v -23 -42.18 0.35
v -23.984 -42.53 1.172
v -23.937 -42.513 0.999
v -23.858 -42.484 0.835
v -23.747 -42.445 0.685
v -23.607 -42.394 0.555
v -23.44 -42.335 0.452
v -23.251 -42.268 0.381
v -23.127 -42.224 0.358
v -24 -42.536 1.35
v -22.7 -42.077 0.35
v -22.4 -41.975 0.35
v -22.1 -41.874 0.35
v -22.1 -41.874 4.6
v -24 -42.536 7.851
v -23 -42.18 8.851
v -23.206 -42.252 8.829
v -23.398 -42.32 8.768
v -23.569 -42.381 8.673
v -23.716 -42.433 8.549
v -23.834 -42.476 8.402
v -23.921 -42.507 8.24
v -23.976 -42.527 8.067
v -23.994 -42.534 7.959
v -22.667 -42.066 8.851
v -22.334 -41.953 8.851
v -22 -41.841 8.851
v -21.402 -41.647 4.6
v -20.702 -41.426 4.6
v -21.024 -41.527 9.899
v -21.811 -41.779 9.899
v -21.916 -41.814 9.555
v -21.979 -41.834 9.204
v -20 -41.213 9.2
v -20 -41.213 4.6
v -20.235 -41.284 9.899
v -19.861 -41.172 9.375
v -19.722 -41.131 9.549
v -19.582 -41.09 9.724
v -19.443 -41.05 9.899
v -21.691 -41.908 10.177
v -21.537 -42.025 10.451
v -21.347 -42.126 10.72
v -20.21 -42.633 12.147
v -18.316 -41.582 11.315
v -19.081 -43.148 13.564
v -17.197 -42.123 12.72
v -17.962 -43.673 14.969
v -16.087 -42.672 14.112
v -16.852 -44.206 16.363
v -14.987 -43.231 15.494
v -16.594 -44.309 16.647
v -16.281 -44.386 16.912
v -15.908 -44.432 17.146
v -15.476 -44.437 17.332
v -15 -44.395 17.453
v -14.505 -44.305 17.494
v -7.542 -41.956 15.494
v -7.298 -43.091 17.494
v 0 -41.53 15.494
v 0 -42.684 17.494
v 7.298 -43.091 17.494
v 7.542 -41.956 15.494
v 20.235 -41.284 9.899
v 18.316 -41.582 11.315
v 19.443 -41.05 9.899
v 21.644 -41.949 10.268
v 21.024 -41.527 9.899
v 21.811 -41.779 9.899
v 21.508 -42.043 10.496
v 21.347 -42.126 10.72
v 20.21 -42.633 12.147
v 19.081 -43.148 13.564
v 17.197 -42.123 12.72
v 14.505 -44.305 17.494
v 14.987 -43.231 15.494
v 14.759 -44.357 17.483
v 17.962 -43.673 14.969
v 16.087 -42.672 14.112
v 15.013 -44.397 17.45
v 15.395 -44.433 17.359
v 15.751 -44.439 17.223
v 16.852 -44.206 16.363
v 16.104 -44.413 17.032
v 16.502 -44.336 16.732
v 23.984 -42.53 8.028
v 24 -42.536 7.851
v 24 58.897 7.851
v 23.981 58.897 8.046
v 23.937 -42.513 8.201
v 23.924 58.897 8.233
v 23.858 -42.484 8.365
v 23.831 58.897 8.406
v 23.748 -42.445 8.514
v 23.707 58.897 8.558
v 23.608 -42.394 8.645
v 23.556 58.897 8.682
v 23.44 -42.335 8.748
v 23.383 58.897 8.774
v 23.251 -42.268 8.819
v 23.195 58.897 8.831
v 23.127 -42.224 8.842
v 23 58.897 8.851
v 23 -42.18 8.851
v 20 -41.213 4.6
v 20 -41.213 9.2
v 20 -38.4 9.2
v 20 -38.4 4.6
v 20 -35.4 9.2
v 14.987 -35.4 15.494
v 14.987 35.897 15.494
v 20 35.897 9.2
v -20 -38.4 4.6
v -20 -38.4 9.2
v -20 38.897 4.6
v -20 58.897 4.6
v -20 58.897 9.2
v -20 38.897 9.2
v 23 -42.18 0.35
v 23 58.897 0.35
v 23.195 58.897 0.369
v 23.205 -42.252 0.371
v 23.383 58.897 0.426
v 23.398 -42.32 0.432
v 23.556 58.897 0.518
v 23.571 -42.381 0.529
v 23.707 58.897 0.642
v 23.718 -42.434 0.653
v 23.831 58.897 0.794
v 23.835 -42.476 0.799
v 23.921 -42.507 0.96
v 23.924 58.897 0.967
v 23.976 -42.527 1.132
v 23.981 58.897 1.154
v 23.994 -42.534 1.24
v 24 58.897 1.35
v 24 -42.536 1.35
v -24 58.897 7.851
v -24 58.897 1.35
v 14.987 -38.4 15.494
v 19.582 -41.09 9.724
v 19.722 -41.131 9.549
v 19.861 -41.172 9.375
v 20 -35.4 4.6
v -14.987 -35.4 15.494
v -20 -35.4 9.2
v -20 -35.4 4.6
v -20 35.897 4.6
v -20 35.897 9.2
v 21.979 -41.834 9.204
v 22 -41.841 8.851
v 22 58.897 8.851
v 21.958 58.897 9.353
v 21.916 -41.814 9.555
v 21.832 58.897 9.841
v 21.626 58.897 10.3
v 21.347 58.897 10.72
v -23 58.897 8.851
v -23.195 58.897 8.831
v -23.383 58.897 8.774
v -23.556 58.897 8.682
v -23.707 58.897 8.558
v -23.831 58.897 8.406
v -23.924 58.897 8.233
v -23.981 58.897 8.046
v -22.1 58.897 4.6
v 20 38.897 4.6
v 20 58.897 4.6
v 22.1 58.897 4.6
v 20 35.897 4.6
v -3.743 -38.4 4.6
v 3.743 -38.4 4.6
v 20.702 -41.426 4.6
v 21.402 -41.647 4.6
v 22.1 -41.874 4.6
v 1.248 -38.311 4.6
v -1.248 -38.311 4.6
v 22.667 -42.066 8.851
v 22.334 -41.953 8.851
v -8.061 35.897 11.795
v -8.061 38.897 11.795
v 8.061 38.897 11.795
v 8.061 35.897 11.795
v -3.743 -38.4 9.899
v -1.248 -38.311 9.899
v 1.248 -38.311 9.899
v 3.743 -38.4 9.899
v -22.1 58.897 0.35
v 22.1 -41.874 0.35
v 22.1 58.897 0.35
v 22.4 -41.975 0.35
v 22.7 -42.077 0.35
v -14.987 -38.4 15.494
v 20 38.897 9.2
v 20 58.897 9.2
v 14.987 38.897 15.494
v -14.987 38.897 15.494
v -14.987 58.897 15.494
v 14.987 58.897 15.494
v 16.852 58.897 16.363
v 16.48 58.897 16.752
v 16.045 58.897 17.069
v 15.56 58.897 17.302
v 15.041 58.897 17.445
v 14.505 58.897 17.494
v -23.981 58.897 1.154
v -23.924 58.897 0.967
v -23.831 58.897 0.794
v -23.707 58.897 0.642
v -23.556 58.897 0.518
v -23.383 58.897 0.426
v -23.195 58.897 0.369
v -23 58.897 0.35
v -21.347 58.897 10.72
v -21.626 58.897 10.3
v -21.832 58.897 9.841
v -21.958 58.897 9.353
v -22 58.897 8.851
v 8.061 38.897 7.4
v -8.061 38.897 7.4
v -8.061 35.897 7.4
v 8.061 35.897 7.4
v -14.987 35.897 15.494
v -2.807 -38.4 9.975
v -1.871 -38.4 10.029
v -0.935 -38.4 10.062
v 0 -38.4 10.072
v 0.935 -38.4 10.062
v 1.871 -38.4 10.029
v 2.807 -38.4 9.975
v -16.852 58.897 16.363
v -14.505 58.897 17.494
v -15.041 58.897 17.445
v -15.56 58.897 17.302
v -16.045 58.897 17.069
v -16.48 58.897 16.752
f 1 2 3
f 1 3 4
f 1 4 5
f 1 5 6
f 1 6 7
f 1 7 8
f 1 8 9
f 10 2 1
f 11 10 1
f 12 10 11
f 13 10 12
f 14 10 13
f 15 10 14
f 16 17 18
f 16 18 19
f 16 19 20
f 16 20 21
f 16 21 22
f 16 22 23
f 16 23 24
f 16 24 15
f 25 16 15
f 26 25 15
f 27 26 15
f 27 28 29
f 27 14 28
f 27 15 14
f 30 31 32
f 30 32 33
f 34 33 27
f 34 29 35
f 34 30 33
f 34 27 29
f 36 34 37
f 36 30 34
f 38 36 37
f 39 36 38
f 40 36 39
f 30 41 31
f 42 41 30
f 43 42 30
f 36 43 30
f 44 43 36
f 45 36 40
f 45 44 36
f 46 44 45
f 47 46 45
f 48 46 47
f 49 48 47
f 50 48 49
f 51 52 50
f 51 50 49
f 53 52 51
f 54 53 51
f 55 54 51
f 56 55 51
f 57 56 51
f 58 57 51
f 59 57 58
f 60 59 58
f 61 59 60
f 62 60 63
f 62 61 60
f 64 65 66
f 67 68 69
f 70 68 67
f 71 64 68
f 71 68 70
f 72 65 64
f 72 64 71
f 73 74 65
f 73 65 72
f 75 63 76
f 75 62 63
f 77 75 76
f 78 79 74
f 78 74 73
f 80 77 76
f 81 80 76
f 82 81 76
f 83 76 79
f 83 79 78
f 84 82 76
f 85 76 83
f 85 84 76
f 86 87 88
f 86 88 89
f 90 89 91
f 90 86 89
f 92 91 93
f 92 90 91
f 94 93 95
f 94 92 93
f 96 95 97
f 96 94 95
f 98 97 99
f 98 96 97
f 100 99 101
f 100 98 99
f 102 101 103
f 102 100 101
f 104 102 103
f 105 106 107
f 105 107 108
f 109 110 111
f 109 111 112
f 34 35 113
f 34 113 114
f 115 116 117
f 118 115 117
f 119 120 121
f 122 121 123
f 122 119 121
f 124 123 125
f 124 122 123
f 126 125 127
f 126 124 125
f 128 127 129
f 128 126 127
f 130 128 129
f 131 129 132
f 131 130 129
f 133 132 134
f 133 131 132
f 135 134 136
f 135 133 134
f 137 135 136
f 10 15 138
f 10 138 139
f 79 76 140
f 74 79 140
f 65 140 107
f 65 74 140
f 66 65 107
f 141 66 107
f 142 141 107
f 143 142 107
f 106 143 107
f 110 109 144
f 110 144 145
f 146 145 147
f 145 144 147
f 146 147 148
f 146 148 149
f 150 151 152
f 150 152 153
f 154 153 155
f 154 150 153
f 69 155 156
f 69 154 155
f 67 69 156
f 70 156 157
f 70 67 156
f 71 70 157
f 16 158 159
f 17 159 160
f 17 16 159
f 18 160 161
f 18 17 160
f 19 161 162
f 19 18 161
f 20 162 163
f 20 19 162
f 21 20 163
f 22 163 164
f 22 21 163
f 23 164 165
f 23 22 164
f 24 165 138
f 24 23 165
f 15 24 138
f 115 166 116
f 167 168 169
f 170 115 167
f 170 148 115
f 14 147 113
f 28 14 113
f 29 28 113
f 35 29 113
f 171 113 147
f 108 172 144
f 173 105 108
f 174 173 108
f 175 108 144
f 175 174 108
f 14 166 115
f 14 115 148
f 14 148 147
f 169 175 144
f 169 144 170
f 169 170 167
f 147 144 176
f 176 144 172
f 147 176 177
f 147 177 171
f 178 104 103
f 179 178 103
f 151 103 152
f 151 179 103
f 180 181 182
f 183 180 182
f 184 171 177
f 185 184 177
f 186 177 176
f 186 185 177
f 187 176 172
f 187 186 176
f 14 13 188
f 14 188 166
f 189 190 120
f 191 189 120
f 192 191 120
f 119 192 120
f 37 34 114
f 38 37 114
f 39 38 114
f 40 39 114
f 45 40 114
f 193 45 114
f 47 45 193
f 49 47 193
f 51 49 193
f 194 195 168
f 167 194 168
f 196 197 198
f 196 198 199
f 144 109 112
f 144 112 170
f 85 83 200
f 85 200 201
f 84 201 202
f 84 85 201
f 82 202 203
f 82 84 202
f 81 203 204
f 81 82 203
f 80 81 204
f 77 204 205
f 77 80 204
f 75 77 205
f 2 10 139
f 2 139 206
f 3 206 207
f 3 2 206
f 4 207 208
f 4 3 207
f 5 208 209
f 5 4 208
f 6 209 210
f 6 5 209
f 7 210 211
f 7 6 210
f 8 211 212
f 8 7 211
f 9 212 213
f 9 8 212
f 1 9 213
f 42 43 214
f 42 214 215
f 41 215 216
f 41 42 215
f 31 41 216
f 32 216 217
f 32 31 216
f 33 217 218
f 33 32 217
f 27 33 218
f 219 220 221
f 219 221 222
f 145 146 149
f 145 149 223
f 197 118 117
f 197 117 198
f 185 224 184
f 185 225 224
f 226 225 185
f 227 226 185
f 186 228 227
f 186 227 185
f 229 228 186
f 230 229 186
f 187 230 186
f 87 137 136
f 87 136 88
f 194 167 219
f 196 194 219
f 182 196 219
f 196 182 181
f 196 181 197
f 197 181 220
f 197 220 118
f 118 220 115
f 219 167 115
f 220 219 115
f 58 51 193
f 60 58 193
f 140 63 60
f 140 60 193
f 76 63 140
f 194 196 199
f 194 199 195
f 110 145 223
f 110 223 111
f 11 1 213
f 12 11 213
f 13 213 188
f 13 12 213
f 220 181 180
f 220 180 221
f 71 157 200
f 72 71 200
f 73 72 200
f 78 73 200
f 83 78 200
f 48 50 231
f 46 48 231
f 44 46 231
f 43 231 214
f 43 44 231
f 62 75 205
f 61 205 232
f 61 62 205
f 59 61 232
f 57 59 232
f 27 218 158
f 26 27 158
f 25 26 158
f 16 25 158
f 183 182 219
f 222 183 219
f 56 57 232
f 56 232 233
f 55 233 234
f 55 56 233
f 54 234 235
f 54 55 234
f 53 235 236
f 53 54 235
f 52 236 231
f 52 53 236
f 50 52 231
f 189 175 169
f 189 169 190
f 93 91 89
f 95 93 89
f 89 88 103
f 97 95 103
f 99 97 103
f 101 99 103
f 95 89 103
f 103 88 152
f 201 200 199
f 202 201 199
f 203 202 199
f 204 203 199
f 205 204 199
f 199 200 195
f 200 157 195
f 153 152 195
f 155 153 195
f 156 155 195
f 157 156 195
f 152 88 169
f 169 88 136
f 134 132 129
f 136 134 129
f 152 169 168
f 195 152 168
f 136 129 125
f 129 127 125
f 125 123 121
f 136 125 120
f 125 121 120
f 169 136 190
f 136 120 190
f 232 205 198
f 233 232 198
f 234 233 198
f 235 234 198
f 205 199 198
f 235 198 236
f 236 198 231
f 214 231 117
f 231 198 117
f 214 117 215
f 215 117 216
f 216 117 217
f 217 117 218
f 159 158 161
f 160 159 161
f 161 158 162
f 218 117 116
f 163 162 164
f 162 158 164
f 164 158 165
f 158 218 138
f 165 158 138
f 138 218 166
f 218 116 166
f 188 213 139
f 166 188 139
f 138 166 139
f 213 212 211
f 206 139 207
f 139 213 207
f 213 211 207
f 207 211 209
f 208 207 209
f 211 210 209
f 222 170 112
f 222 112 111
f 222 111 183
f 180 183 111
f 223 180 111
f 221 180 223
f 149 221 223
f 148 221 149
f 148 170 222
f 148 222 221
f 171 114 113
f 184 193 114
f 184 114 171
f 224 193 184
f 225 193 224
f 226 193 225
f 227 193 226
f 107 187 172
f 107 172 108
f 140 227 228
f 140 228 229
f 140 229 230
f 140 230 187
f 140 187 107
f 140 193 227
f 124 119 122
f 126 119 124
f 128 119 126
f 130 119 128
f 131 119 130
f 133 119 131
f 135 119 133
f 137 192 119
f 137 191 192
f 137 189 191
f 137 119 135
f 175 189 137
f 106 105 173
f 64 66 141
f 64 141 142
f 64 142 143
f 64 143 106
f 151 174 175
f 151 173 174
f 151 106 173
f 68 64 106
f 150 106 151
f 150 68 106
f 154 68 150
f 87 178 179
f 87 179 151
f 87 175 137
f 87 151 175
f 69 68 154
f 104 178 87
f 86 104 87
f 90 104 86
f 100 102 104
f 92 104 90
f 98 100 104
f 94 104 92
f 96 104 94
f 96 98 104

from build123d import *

# Parameters (mm, degrees)
EXTRUDE_1_DEPTH     = 58.89737674
EXTRUDE_START       = 38.399597665
EXTRUDE_2_DEPTH     = 38.399597665
EXTRUDE_3_REACH     = 66.893
SKETCH_3_W          = 44.2
SKETCH_3_H          = 3
EXTRUDE_4_REACH     = 66.893
SKETCH_4_W          = 44.2
SKETCH_4_H          = 3
CUT_EXTRUDE_START   = -77.29697691
CUT_EXTRUDE_1_DEPTH = 77.29697691
SKETCH_6_W          = 16.122631446
SKETCH_6_H          = 4.394864928
CUT_EXTRUDE_2_DEPTH = 3
EXTRUDE_START_2     = 15
EXTRUDE_5_DEPTH     = 15


with BuildPart() as part:
    # 草图1 → 凸台-拉伸1 (new body)
    with BuildSketch(Plane(origin=(0, 0, 0), x_dir=(1, 0, 0), z_dir=(0, 1, 0))):
        with BuildLine():
            Line((21.346642729, -10.719560241), (16.852020459, -16.362765964))
            ThreePointArc((16.852020459, -16.362765964), (15.807857901, -17.196247295), (14.505374257, -17.493741725))
            Line((14.505374257, -17.493741725), (-14.505381202, -17.493741725))
            ThreePointArc((-14.505381202, -17.493741725), (-15.807864846, -17.196247295), (-16.852027404, -16.362765964))
            Line((-16.852027404, -16.362765964), (-21.346649674, -10.719560241))
            ThreePointArc((-21.346649674, -10.719560241), (-21.831958504, -9.840501001), (-22.000003473, -8.850536003))
            Line((-22.000003473, -8.850536003), (-23.000003473, -8.850536003))
            ThreePointArc((-23.000003473, -8.850536003), (-23.707110254, -8.557642784), (-24.000003473, -7.850536003))
            Line((-24.000003473, -7.850536003), (-24.000003473, -1.349569462))
            ThreePointArc((-24.000003473, -1.349569462), (-23.707110254, -0.642462681), (-23.000003473, -0.349569462))
            Line((-23.000003473, -0.349569462), (-22.100003473, -0.349569462))
            Line((-22.100003473, -0.349569462), (-22.100003473, -4.600052733))
            Line((-22.100003473, -4.600052733), (-22.000003473, -4.600052733))
            Line((-22.000003473, -4.600052733), (-20.000003473, -4.600052733))
            Line((-20.000003473, -4.600052733), (-20.000003473, -9.200105465))
            Line((-20.000003473, -9.200105465), (-14.987335304, -15.493741725))
            Line((-14.987335304, -15.493741725), (14.987328359, -15.493741725))
            Line((14.987328359, -15.493741725), (19.999996527, -9.200105465))
            Line((19.999996527, -9.200105465), (19.999996527, -4.600052733))
            Line((19.999996527, -4.600052733), (21.999996527, -4.600052733))
            Line((21.999996527, -4.600052733), (22.099996527, -4.600052733))
            Line((22.099996527, -4.600052733), (22.099996527, -0.349569462))
            Line((22.099996527, -0.349569462), (22.999996527, -0.349569462))
            ThreePointArc((22.999996527, -0.349569462), (23.707103309, -0.642462681), (23.999996527, -1.349569462))
            Line((23.999996527, -1.349569462), (23.999996527, -7.850536003))
            ThreePointArc((23.999996527, -7.850536003), (23.707103309, -8.557642784), (22.999996527, -8.850536003))
            Line((22.999996527, -8.850536003), (21.999996527, -8.850536003))
            ThreePointArc((21.999996527, -8.850536003), (21.831951559, -9.840501001), (21.346642729, -10.719560241))
        make_face()
    extrude(amount=EXTRUDE_1_DEPTH)

    # 草图2 → 凸台-拉伸2 (add)
    with BuildSketch(Plane.XZ.offset(EXTRUDE_START)):
        with BuildLine():
            Line((22.999996527, 8.850536003), (21.999996527, 8.850536003))
            ThreePointArc((21.999996527, 8.850536003), (21.831951559, 9.840501001), (21.346642729, 10.719560241))
            Line((21.346642729, 10.719560241), (16.852020459, 16.362765964))
            ThreePointArc((16.852020459, 16.362765964), (15.807857901, 17.196247295), (14.505374257, 17.493741725))
            Line((14.505374257, 17.493741725), (-14.505381202, 17.493741725))
            ThreePointArc((-14.505381202, 17.493741725), (-15.807864846, 17.196247295), (-16.852027404, 16.362765964))
            Line((-16.852027404, 16.362765964), (-21.346649674, 10.719560241))
            ThreePointArc((-21.346649674, 10.719560241), (-21.831958504, 9.840501001), (-22.000003473, 8.850536003))
            Line((-22.000003473, 8.850536003), (-23.000003473, 8.850536003))
            ThreePointArc((-23.000003473, 8.850536003), (-23.707110254, 8.557642784), (-24.000003473, 7.850536003))
            Line((-24.000003473, 7.850536003), (-24.000003473, 1.349569462))
            ThreePointArc((-24.000003473, 1.349569462), (-23.707110254, 0.642462681), (-23.000003473, 0.349569462))
            Line((-23.000003473, 0.349569462), (-22.100003473, 0.349569462))
            Line((-22.100003473, 0.349569462), (-22.100003473, 4.600052733))
            Line((-22.100003473, 4.600052733), (-20.000003473, 4.600052733))
            Line((-20.000003473, 4.600052733), (-20.000003473, 9.200105465))
            Line((-20.000003473, 9.200105465), (-14.987335304, 15.493741725))
            Line((-14.987335304, 15.493741725), (14.987328359, 15.493741725))
            Line((14.987328359, 15.493741725), (19.999996527, 9.200105465))
            Line((19.999996527, 9.200105465), (19.999996527, 4.600052733))
            Line((19.999996527, 4.600052733), (22.099996527, 4.600052733))
            Line((22.099996527, 4.600052733), (22.099996527, 0.349569462))
            Line((22.099996527, 0.349569462), (22.999996527, 0.349569462))
            ThreePointArc((22.999996527, 0.349569462), (23.707103309, 0.642462681), (23.999996527, 1.349569462))
            Line((23.999996527, 1.349569462), (23.999996527, 7.850536003))
            ThreePointArc((23.999996527, 7.850536003), (23.707103309, 8.557642784), (22.999996527, 8.850536003))
        make_face()
    extrude(amount=-EXTRUDE_2_DEPTH)

    # 凸台-拉伸3: up to this face of the body (flat: up to its plane)
    extrude_3_end = Plane(part.part.faces().sort_by_distance((-3.473e-06, 10.248889538, 17.493741725))[0])
    # 草图3 → 凸台-拉伸3 (add, up to the picked face)
    with BuildSketch(Plane(origin=(0, 0, 4.600052733), x_dir=(-1, 0, 0), z_dir=(0, 0, -1)), mode=Mode.PRIVATE) as extrude_3_sk1:
        with Locations((3.473e-06, -36.899597665)):
            Rectangle(SKETCH_3_W, SKETCH_3_H)
    extrude_3_tool1 = split(extrude(extrude_3_sk1.sketch, amount=-EXTRUDE_3_REACH, mode=Mode.PRIVATE), bisect_by=extrude_3_end, keep=Keep.BOTH, mode=Mode.PRIVATE)
    add(extrude_3_tool1.solids().sort_by(Axis((-3e-06, -36.899598, 4.600053), (0, 0, 1)))[0])

    # 凸台-拉伸4: up to this face of the body (flat: up to its plane)
    extrude_4_end = Plane(part.part.faces().sort_by_distance((-3.473e-06, 9.499837909, 17.493741725))[0])
    # 草图4 → 凸台-拉伸4 (add, up to the picked face)
    with BuildSketch(Plane(origin=(0, 0, 4.600052733), x_dir=(-1, 0, 0), z_dir=(0, 0, -1)), mode=Mode.PRIVATE) as extrude_4_sk1:
        with Locations((3.473e-06, 37.397379245)):
            Rectangle(SKETCH_4_W, SKETCH_4_H)
    extrude_4_tool1 = split(extrude(extrude_4_sk1.sketch, amount=-EXTRUDE_4_REACH, mode=Mode.PRIVATE), bisect_by=extrude_4_end, keep=Keep.BOTH, mode=Mode.PRIVATE)
    add(extrude_4_tool1.solids().sort_by(Axis((-3e-06, 37.397379, 4.600053), (0, 0, 1)))[0])

    # 草图5 → 切除-拉伸1 (cut)
    with BuildSketch(Plane(origin=(0, 38.897379245, 0), x_dir=(1, 0, 0), z_dir=(0, 1, 0)).offset(CUT_EXTRUDE_START)):
        with BuildLine():
            Line((-22.100003473, -8.850536003), (-22.100003473, -17.493741725))
            Line((-22.100003473, -17.493741725), (-14.505381202, -17.493741725))
            ThreePointArc((-14.505381202, -17.493741725), (-15.807864846, -17.196247295), (-16.852027404, -16.362765964))
            Line((-16.852027404, -16.362765964), (-21.346649674, -10.719560241))
            ThreePointArc((-21.346649674, -10.719560241), (-21.831958504, -9.840501001), (-22.000003473, -8.850536003))
            Line((-22.000003473, -8.850536003), (-22.100003473, -8.850536003))
        make_face()
        with BuildLine():
            Line((14.505374257, -17.493741725), (22.099996527, -17.493741725))
            Line((22.099996527, -17.493741725), (22.099996527, -8.850536003))
            Line((22.099996527, -8.850536003), (21.999996527, -8.850536003))
            ThreePointArc((21.999996527, -8.850536003), (21.831951559, -9.840501001), (21.346642729, -10.719560241))
            Line((21.346642729, -10.719560241), (16.852020459, -16.362765964))
            ThreePointArc((16.852020459, -16.362765964), (15.807857901, -17.196247295), (14.505374257, -17.493741725))
        make_face()
    extrude(amount=CUT_EXTRUDE_1_DEPTH, mode=Mode.SUBTRACT)

    # 草图6 → 切除-拉伸2 (cut)
    with BuildSketch(Plane(origin=(0, 38.897379245, 0), x_dir=(1, 0, 0), z_dir=(0, 1, 0))):
        with Locations((0, -9.597483264)):
            Rectangle(SKETCH_6_W, SKETCH_6_H)
    extrude(amount=-CUT_EXTRUDE_2_DEPTH, mode=Mode.SUBTRACT)

    # 草图7 → 凸台-拉伸5 (add)
    with BuildSketch(Plane(origin=(0, -38.399597665, 0), x_dir=(-1, 0, 0), z_dir=(0, -1, 0)).offset(EXTRUDE_START_2)):
        with BuildLine():
            Line((20.000003473, -4.600052733), (20.000003473, -9.200105465))
            Line((20.000003473, -9.200105465), (14.987335304, -15.493741725))
            Line((14.987335304, -15.493741725), (-14.987328359, -15.493741725))
            Line((-14.987328359, -15.493741725), (-19.999996527, -9.200105465))
            Line((-19.999996527, -9.200105465), (-19.999996527, -4.600052733))
            Line((-19.999996527, -4.600052733), (-21.999996527, -4.600052733))
            Line((-21.999996527, -4.600052733), (-22.099996527, -4.600052733))
            Line((-22.099996527, -4.600052733), (-22.099996527, -0.349569462))
            Line((-22.099996527, -0.349569462), (-22.999996527, -0.349569462))
            ThreePointArc((-22.999996527, -0.349569462), (-23.707103309, -0.642462681), (-23.999996527, -1.349569462))
            Line((-23.999996527, -1.349569462), (-23.999996527, -7.850536003))
            ThreePointArc((-23.999996527, -7.850536003), (-23.707103309, -8.557642784), (-22.999996527, -8.850536003))
            Line((-22.999996527, -8.850536003), (-21.999996527, -8.850536003))
            ThreePointArc((-21.999996527, -8.850536003), (-21.831951559, -9.840501001), (-21.346642729, -10.719560241))
            Line((-21.346642729, -10.719560241), (-16.852020459, -16.362765964))
            ThreePointArc((-16.852020459, -16.362765964), (-15.807857901, -17.196247295), (-14.505374257, -17.493741725))
            Line((-14.505374257, -17.493741725), (14.505381202, -17.493741725))
            ThreePointArc((14.505381202, -17.493741725), (15.807864846, -17.196247295), (16.852027404, -16.362765964))
            Line((16.852027404, -16.362765964), (21.346649674, -10.719560241))
            ThreePointArc((21.346649674, -10.719560241), (21.831958504, -9.840501001), (22.000003473, -8.850536003))
            Line((22.000003473, -8.850536003), (23.000003473, -8.850536003))
            ThreePointArc((23.000003473, -8.850536003), (23.707110254, -8.557642784), (24.000003473, -7.850536003))
            Line((24.000003473, -7.850536003), (24.000003473, -1.349569462))
            ThreePointArc((24.000003473, -1.349569462), (23.707110254, -0.642462681), (23.000003473, -0.349569462))
            Line((23.000003473, -0.349569462), (22.100003473, -0.349569462))
            Line((22.100003473, -0.349569462), (22.100003473, -4.600052733))
            Line((22.100003473, -4.600052733), (22.000003473, -4.600052733))
            Line((22.000003473, -4.600052733), (20.000003473, -4.600052733))
        make_face()
    extrude(amount=-EXTRUDE_5_DEPTH)

    # 草图8 → 切除-旋转1 (revolve, cut)
    with BuildSketch(Plane(origin=(0, 0, 0), x_dir=(0, 0, -1), z_dir=(1, 0, 0))):
        Polygon((-9.89924439, -38.299597665), (-20.291549236, -44.299597665), (-20.291549236, -55.801852499), (11.09144377, -55.801852499), (11.09144377, -44.299597665), (0.699138925, -38.299597665), align=None)
    revolve(axis=Axis((0, -108.399597665, 9.89924439), (0, 0, -1)), mode=Mode.SUBTRACT)


solid = part.part
